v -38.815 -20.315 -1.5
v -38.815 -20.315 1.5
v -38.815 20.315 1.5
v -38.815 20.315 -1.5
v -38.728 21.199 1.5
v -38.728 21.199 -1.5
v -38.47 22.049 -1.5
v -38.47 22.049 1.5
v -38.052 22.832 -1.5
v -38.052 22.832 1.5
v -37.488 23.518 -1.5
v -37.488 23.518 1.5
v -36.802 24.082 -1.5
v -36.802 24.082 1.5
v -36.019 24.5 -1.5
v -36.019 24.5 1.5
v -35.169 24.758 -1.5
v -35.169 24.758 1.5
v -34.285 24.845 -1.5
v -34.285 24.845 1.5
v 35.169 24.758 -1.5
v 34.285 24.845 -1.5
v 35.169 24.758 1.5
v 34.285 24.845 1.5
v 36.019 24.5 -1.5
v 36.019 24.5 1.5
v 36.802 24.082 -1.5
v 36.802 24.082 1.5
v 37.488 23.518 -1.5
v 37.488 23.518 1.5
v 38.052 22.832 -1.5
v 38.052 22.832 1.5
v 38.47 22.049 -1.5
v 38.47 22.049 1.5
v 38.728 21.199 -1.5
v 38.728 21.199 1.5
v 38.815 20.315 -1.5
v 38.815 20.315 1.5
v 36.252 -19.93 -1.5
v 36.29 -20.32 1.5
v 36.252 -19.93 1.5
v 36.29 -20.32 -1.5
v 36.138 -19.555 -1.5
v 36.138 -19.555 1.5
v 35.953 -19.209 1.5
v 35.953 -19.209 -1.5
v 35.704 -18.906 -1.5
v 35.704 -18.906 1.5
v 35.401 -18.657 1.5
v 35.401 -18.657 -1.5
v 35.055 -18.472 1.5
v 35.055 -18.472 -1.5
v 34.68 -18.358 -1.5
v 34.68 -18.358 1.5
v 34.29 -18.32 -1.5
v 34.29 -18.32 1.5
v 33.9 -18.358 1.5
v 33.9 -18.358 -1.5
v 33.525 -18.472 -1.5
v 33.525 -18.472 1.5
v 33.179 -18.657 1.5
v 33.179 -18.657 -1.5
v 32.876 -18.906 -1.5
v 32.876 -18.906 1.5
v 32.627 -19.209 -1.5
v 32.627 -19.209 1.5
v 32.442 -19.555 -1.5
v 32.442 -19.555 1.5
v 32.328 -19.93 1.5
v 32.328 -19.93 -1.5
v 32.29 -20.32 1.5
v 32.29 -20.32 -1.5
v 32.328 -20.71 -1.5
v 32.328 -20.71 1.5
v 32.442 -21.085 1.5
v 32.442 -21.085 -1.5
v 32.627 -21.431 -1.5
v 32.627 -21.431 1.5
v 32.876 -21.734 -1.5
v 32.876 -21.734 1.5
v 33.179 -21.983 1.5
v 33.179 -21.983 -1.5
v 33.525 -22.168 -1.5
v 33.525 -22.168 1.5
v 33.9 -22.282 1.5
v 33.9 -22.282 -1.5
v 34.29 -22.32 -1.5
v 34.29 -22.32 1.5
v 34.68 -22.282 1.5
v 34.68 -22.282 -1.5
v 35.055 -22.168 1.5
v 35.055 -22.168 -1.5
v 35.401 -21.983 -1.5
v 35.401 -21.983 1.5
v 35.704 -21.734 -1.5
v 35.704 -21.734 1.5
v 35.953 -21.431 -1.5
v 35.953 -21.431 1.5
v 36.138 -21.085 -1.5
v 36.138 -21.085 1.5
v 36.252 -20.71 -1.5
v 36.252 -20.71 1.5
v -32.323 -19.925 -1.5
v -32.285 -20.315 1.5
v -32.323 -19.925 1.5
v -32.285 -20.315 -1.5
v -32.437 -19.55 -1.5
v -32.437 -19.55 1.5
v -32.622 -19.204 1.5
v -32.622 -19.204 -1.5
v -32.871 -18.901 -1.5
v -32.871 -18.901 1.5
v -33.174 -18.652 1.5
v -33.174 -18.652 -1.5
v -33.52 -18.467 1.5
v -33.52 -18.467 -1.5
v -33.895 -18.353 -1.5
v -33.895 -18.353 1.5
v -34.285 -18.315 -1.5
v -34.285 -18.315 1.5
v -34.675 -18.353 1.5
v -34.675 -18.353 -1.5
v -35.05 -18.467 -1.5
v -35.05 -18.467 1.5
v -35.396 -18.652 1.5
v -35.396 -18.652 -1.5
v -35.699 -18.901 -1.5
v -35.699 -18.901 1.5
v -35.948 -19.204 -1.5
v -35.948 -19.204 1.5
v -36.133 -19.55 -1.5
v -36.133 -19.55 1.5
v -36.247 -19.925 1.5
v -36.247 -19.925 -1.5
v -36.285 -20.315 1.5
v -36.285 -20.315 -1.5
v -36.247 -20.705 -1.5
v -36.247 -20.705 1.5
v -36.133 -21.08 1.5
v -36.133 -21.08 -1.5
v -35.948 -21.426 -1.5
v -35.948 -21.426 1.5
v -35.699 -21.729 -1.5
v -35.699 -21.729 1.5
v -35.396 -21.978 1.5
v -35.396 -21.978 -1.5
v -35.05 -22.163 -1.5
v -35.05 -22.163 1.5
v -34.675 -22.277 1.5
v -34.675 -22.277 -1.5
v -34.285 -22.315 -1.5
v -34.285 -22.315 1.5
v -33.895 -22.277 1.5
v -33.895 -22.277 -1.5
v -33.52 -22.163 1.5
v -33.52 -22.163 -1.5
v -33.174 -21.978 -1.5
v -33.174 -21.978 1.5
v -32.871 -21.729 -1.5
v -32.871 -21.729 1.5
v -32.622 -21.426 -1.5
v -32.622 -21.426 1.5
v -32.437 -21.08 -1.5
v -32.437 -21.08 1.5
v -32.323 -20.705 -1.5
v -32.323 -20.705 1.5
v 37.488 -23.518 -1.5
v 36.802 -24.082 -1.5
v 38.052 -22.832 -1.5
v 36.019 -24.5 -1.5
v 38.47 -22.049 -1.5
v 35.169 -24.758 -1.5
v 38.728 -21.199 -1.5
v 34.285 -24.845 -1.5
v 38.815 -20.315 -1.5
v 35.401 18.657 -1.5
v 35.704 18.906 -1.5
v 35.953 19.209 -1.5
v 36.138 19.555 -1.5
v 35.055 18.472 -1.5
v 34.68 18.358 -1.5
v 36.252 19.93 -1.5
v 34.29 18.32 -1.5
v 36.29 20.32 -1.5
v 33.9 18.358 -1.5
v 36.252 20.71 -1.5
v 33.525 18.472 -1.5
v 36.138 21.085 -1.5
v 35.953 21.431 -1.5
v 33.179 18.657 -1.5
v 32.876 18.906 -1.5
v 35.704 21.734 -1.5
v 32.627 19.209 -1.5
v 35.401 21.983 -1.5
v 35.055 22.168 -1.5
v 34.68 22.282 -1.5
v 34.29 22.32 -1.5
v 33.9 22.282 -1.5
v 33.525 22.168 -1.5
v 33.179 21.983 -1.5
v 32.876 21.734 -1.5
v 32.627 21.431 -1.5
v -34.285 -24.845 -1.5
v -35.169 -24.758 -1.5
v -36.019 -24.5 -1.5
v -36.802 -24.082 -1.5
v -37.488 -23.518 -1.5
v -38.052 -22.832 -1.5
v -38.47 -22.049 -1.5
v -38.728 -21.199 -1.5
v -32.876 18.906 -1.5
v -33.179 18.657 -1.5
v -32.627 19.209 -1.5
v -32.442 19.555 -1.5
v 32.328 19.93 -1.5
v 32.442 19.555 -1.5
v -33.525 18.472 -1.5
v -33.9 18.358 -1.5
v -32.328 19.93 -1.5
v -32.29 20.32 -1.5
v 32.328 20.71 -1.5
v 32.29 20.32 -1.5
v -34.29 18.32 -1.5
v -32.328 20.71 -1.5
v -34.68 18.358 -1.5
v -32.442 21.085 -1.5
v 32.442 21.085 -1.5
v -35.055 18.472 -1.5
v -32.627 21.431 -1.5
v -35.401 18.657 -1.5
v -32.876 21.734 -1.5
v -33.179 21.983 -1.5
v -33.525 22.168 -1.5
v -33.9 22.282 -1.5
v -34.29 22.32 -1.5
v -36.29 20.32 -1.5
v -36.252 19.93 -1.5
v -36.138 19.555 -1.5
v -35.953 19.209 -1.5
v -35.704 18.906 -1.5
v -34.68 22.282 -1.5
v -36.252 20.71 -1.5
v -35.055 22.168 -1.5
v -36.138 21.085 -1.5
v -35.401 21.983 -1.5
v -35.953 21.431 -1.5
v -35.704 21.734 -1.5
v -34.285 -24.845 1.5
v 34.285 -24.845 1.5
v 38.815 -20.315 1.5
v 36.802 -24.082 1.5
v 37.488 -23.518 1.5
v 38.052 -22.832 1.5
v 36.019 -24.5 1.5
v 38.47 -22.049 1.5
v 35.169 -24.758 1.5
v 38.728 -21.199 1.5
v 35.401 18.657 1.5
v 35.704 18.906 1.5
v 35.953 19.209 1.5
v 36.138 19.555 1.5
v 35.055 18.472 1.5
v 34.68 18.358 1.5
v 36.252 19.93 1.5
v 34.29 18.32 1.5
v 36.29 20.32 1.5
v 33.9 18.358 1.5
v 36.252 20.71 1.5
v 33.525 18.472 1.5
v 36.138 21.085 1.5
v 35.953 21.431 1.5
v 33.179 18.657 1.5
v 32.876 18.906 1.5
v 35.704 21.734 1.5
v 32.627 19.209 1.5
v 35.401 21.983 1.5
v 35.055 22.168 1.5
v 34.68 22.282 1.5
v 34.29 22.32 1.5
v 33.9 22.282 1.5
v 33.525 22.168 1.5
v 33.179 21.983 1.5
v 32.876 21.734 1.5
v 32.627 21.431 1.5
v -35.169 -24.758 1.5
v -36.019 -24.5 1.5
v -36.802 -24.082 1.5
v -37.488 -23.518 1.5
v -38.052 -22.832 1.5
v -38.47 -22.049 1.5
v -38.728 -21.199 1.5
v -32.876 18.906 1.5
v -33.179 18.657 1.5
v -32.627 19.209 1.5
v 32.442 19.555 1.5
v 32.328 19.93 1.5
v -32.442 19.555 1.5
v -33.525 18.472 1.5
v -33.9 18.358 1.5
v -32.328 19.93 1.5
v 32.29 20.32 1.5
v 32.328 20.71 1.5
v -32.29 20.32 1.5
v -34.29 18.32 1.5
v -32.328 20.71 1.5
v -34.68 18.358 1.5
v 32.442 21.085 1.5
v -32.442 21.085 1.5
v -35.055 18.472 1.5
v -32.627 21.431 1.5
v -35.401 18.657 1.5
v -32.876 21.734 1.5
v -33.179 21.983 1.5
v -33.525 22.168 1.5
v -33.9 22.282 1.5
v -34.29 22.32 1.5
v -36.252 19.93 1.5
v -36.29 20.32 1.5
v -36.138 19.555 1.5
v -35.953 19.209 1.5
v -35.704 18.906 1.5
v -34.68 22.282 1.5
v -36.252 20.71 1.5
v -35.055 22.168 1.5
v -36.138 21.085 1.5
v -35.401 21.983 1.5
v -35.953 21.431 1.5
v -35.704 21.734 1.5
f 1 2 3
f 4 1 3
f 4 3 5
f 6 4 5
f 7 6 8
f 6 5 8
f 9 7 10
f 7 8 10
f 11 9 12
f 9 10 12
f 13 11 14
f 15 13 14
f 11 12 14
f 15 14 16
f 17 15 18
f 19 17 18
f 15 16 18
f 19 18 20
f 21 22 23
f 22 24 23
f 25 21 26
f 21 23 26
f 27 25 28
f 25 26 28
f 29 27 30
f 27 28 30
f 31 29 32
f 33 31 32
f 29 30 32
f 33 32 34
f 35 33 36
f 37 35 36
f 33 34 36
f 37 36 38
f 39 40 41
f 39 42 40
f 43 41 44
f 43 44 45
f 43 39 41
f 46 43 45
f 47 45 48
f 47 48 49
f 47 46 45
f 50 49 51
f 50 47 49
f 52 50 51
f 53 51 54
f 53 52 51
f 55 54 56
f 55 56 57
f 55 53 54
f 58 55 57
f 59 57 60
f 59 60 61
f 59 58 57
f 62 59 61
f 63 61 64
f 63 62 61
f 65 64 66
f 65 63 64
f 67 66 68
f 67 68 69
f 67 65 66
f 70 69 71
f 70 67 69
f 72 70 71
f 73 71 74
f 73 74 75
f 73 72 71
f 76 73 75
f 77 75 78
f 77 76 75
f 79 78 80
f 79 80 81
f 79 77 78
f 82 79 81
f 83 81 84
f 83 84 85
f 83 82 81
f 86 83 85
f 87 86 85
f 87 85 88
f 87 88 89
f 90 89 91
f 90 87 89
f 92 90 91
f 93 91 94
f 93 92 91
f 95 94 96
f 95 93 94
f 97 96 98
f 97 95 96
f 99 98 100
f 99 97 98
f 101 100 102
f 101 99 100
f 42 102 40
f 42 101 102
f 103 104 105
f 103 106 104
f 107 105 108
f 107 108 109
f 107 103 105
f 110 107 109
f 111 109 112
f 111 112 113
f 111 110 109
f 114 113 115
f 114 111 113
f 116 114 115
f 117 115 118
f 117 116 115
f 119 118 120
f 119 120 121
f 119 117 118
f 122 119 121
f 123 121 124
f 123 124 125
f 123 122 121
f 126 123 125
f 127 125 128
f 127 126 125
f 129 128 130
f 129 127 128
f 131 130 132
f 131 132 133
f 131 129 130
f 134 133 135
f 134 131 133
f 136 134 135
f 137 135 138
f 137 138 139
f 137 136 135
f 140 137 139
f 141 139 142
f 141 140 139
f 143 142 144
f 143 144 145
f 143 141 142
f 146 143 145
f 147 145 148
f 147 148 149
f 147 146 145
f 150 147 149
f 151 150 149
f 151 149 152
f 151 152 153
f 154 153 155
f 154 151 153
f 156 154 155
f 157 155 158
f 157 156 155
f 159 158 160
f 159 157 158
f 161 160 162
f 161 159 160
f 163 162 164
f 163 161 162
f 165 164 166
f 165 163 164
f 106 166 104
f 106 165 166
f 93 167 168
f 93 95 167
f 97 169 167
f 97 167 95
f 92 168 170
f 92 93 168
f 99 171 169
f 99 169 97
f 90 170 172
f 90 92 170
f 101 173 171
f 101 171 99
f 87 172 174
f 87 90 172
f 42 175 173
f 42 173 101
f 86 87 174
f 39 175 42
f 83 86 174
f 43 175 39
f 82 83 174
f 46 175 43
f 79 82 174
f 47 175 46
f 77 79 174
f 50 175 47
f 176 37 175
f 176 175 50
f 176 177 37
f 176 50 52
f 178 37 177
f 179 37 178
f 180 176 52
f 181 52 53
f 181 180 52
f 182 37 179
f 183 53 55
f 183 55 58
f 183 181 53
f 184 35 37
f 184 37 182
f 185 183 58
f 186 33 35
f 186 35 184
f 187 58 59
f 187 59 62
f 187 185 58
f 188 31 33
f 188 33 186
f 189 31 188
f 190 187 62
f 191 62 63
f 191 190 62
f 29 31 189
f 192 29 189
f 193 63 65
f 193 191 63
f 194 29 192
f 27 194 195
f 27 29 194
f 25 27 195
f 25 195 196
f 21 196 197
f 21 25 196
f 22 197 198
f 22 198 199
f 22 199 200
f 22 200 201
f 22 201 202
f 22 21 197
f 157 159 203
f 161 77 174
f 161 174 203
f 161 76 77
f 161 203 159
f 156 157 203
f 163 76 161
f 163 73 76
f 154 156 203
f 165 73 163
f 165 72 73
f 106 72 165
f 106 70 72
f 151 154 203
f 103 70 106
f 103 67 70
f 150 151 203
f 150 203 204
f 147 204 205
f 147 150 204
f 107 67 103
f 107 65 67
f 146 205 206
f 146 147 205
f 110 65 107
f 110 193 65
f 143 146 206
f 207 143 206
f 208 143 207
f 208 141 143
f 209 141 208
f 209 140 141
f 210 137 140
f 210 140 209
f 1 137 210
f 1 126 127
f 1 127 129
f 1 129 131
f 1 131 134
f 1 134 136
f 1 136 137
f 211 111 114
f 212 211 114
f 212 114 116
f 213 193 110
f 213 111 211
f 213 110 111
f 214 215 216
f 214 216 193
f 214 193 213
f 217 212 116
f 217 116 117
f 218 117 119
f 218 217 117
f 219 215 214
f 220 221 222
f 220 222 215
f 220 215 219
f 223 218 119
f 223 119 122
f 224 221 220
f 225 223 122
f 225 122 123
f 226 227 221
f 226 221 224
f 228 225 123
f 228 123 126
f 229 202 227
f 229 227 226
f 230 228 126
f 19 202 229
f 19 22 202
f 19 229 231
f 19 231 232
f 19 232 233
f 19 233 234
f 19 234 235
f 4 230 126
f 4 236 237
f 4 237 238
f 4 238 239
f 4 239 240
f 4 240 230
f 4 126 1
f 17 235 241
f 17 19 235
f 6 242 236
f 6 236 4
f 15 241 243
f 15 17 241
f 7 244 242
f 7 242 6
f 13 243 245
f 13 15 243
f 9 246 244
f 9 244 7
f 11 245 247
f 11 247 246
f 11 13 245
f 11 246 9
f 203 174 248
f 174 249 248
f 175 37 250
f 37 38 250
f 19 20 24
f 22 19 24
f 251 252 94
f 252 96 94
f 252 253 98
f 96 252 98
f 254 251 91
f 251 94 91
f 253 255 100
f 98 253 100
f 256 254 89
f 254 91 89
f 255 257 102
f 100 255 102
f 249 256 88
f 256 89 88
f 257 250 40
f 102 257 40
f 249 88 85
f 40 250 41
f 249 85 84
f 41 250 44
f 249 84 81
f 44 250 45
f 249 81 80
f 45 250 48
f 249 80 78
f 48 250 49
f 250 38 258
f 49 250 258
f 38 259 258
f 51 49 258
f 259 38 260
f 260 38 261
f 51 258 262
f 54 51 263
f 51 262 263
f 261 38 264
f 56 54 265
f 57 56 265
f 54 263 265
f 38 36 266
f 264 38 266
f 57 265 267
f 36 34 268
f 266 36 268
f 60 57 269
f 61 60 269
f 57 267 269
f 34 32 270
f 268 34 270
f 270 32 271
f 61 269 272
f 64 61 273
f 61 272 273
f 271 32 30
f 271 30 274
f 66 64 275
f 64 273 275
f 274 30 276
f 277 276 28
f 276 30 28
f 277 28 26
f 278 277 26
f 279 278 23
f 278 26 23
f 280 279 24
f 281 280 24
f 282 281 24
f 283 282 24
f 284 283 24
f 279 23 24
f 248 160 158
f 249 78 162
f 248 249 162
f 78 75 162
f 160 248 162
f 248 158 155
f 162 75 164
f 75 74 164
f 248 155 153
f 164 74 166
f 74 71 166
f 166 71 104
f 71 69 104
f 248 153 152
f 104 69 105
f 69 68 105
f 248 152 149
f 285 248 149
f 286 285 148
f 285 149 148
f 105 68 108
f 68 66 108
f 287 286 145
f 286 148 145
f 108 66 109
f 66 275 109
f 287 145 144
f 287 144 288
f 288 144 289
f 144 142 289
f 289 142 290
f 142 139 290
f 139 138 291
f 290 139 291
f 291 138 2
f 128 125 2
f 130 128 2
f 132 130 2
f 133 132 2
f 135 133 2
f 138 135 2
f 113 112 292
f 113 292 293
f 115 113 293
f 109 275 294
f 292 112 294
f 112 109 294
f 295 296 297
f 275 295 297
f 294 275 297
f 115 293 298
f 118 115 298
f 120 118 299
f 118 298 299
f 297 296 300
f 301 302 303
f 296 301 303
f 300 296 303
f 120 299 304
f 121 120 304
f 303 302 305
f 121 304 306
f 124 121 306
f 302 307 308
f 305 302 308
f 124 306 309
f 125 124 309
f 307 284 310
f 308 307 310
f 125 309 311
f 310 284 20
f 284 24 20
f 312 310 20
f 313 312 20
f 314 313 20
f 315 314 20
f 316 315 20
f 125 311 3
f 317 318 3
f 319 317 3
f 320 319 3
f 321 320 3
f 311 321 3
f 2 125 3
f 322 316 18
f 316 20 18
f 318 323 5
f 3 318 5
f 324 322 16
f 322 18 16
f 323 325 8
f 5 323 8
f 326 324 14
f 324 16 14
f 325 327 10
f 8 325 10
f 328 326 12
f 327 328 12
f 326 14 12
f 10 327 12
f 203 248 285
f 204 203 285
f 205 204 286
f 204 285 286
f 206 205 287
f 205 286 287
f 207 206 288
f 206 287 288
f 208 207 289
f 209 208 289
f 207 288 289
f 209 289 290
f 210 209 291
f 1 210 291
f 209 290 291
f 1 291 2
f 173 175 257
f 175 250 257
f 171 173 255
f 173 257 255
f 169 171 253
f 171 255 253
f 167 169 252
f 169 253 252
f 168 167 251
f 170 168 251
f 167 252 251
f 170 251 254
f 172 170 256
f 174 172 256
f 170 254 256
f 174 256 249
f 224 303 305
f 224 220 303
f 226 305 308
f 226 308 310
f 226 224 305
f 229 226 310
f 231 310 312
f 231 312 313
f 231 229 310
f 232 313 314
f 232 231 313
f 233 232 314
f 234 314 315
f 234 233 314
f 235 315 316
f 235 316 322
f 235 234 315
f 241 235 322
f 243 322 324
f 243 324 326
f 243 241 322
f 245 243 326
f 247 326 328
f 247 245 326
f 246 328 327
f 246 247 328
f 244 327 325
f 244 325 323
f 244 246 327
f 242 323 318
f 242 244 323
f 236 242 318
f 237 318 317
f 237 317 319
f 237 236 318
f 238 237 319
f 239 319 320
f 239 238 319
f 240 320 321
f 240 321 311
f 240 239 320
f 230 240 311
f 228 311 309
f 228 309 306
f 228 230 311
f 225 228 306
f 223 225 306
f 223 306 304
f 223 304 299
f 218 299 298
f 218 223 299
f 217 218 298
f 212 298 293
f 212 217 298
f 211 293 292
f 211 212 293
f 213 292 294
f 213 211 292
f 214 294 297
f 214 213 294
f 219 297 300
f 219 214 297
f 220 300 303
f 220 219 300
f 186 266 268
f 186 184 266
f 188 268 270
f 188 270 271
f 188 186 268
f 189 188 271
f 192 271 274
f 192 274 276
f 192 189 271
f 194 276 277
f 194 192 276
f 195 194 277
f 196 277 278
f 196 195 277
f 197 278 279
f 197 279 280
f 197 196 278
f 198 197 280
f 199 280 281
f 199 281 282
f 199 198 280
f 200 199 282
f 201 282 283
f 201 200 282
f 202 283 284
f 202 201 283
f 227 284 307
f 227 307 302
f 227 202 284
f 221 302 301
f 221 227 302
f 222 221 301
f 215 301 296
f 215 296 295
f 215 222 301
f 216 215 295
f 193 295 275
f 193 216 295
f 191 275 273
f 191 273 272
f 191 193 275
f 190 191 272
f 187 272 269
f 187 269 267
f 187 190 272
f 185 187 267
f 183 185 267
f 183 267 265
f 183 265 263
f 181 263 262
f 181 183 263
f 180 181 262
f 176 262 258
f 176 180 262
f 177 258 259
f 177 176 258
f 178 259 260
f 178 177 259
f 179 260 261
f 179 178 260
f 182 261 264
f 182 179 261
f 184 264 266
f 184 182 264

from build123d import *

# Parameters (mm, degrees)
SKETCH_1_R      = 2
EXTRUDE_1_DEPTH = 1.5


with BuildPart() as part:
    # 草图1 → 凸台-拉伸1 (new, symmetric)
    with BuildSketch(Plane.XY):
        with BuildLine():
            Line((-34.285, 24.845), (34.285, 24.845))
            ThreePointArc((34.285, 24.845), (37.488193719, 23.518193719), (38.815, 20.315))
            Line((38.815, 20.315), (38.815, -20.315))
            ThreePointArc((38.815, -20.315), (37.488193719, -23.518193719), (34.285, -24.845))
            Line((34.285, -24.845), (-34.285, -24.845))
            ThreePointArc((-34.285, -24.845), (-37.488193719, -23.518193719), (-38.815, -20.315))
            Line((-38.815, -20.315), (-38.815, 20.315))
            ThreePointArc((-38.815, 20.315), (-37.488193719, 23.518193719), (-34.285, 24.845))
        make_face()
        with Locations((34.29, 20.32)):
            Circle(SKETCH_1_R, mode=Mode.SUBTRACT)
        with Locations((34.29, -20.32)):
            Circle(SKETCH_1_R, mode=Mode.SUBTRACT)
        with Locations((-34.29, 20.32)):
            Circle(SKETCH_1_R, mode=Mode.SUBTRACT)
        with Locations((-34.285, -20.315)):
            Circle(SKETCH_1_R, mode=Mode.SUBTRACT)
    extrude(amount=EXTRUDE_1_DEPTH, both=True)


solid = part.part
